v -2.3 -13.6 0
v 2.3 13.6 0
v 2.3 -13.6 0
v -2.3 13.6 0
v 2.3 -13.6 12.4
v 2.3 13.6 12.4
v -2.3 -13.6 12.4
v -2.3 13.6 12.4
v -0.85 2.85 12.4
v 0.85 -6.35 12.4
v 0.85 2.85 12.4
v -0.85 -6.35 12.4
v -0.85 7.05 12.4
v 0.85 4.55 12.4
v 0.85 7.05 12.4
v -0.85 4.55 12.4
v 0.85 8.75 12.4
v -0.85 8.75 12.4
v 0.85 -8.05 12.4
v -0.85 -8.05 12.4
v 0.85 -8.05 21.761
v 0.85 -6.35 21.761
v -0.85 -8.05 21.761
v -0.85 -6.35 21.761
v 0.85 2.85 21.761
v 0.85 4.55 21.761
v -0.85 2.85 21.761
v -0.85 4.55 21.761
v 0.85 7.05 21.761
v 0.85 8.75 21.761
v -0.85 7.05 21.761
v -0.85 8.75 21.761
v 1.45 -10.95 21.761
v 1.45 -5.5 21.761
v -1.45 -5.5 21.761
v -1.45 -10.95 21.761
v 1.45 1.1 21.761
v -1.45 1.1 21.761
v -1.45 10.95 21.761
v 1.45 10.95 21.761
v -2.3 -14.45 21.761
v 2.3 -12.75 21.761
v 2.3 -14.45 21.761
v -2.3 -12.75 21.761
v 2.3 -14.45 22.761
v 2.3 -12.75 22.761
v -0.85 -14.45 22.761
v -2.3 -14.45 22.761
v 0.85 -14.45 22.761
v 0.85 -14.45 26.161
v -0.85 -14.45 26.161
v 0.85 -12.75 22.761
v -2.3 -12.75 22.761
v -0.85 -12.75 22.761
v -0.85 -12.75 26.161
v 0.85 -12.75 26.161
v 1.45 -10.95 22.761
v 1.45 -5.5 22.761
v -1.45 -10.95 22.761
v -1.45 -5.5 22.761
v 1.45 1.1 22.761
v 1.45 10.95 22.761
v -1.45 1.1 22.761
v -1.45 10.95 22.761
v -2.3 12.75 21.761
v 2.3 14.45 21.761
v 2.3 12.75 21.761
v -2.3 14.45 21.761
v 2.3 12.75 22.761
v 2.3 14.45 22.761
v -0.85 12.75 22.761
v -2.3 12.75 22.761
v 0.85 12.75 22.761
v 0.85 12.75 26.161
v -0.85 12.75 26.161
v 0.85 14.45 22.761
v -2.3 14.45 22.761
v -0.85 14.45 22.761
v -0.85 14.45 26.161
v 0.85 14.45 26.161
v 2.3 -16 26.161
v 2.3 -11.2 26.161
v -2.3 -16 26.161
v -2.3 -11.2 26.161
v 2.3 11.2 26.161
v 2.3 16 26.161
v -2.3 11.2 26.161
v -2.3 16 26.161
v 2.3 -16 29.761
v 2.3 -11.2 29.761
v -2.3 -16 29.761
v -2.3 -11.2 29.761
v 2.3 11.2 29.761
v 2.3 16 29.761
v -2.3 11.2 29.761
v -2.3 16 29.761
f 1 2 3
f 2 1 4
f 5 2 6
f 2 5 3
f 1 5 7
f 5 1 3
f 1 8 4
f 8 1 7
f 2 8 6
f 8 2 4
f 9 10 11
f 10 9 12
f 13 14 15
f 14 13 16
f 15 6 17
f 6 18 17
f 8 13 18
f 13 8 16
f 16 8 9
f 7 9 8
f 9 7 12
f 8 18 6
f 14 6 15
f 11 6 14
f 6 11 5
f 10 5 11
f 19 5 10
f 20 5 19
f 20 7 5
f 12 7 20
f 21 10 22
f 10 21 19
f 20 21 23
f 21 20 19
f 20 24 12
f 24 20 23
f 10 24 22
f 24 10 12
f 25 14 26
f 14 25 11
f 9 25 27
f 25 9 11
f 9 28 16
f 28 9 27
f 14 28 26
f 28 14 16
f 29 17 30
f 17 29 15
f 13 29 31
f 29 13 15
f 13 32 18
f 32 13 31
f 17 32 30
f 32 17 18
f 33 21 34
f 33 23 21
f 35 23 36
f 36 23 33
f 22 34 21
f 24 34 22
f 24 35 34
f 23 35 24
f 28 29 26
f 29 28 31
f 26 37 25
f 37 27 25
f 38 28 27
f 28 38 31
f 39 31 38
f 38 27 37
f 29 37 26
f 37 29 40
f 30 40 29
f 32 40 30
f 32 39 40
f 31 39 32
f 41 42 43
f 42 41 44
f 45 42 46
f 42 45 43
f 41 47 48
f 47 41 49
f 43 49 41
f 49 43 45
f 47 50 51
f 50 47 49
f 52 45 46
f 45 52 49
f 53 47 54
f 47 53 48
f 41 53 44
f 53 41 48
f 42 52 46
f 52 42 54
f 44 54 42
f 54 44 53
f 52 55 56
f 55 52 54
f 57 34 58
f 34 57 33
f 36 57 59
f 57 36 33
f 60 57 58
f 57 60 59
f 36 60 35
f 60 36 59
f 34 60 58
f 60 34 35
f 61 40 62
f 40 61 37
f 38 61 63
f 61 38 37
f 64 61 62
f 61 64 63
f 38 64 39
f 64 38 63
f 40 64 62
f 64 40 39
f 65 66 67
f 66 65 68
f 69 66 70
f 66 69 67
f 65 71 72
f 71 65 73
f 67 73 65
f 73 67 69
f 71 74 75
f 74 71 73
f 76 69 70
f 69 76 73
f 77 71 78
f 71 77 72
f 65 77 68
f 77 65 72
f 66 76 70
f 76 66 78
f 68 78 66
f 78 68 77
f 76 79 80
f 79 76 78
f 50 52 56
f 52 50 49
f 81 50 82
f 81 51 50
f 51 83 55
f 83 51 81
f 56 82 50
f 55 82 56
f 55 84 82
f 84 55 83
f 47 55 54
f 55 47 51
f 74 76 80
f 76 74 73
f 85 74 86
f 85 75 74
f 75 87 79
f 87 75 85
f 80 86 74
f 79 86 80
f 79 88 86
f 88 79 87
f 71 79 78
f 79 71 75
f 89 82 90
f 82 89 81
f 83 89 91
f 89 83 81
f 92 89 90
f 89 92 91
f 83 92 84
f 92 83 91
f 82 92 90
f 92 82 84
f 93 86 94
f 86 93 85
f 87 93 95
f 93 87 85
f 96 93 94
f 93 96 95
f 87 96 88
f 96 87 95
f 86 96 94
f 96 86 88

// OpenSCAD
// Generated by SolidPython 0.4.2 on 2020-09-29 23:22:29
//!OpenSCAD

scale(v = 0.0100000000) {
	translate(v = [-230, -1360, 0]) {
		union() {
			color(c = [0.4000000000, 0.4000000000, 0.4000000000]) {
				translate(v = [0, 0, 0]) {
					linear_extrude(height = 1000.0000000000) {
						polygon(paths = [[0, 1, 2, 3]], points = [[0, 0], [0, 2720], [460, 2720], [460, 0]]);
					}
				}
			}
			color(c = [0.2000000000, 0.6000000000, 0.2000000000]) {
				translate(v = [0, 0, 1000.0000000000]) {
					linear_extrude(height = 120.0000000000) {
						polygon(paths = [[0, 1, 2, 3]], points = [[0, 1305], [0, 2720], [460, 2720], [460, 1305]]);
					}
				}
			}
			color(c = [0.4000000000, 0.4000000000, 0.4000000000]) {
				translate(v = [0, 0, 1000.0000000000]) {
					linear_extrude(height = 120.0000000000) {
						polygon(paths = [[0, 1, 2, 3]], points = [[0, 0], [0, 1305], [460, 1305], [460, 0]]);
					}
				}
			}
			color(c = [0.2000000000, 0.6000000000, 0.2000000000]) {
				translate(v = [0, 0, 1120.0000000000]) {
					linear_extrude(height = 120.0000000000) {
						polygon(paths = [[0, 1, 2, 3]], points = [[0, 1305], [0, 2720], [460, 2720], [460, 1305]]);
					}
				}
			}
			color(c = [0.4000000000, 0.4000000000, 0.4000000000]) {
				translate(v = [0, 0, 1120.0000000000]) {
					linear_extrude(height = 120.0000000000) {
						polygon(paths = [[0, 1, 2, 3]], points = [[0, 0], [0, 1305], [460, 1305], [460, 0]]);
					}
				}
			}
			color(c = [0.1000000000, 0.1000000000, 0.1000000000]) {
				translate(v = [0, 0, 1240.0000000000]) {
					linear_extrude(height = 70.0000000000) {
						polygon(paths = [[0, 1, 2, 3]], points = [[145, 555], [145, 725], [315, 725], [315, 555]]);
					}
				}
			}
			color(c = [0.1000000000, 0.1000000000, 0.1000000000]) {
				translate(v = [0, 0, 1240.0000000000]) {
					linear_extrude(height = 70.0000000000) {
						polygon(paths = [[0, 1, 2, 3]], points = [[145, 1645], [145, 1815], [315, 1815], [315, 1645]]);
					}
				}
			}
			color(c = [0.1000000000, 0.1000000000, 0.1000000000]) {
				translate(v = [0, 0, 1240.0000000000]) {
					linear_extrude(height = 70.0000000000) {
						polygon(paths = [[0, 1, 2, 3]], points = [[145, 2065], [145, 2235], [315, 2235], [315, 2065]]);
					}
				}
			}
			color(c = [0.1000000000, 0.1000000000, 0.1000000000]) {
				translate(v = [0, 0, 1310.0000000000]) {
					linear_extrude(height = 180.0000000000) {
						polygon(paths = [[0, 1, 2, 3]], points = [[145, 555], [145, 725], [315, 725], [315, 555]]);
					}
				}
			}
			color(c = [0.1000000000, 0.1000000000, 0.1000000000]) {
				translate(v = [0, 0, 1310.0000000000]) {
					linear_extrude(height = 180.0000000000) {
						polygon(paths = [[0, 1, 2, 3]], points = [[145, 1645], [145, 1815], [315, 1815], [315, 1645]]);
					}
				}
			}
			color(c = [0.1000000000, 0.1000000000, 0.1000000000]) {
				translate(v = [0, 0, 1310.0000000000]) {
					linear_extrude(height = 180.0000000000) {
						polygon(paths = [[0, 1, 2, 3]], points = [[145, 2065], [145, 2235], [315, 2235], [315, 2065]]);
					}
				}
			}
			color(c = [0.1000000000, 0.1000000000, 0.1000000000]) {
				translate(v = [0, 0, 1490.0000000000]) {
					linear_extrude(height = 686.1000000000) {
						polygon(paths = [[0, 1, 2, 3]], points = [[145, 555], [145, 725], [315, 725], [315, 555]]);
					}
				}
			}
			color(c = [0.1000000000, 0.1000000000, 0.1000000000]) {
				translate(v = [0, 0, 1490.0000000000]) {
					linear_extrude(height = 686.1000000000) {
						polygon(paths = [[0, 1, 2, 3]], points = [[145, 1645], [145, 1815], [315, 1815], [315, 1645]]);
					}
				}
			}
			color(c = [0.1000000000, 0.1000000000, 0.1000000000]) {
				translate(v = [0, 0, 1490.0000000000]) {
					linear_extrude(height = 686.1000000000) {
						polygon(paths = [[0, 1, 2, 3]], points = [[145, 2065], [145, 2235], [315, 2235], [315, 2065]]);
					}
				}
			}
			color(c = [0.9000000000, 0.6000000000, 0.6000000000]) {
				translate(v = [0, 0, 2176.1000000000]) {
					linear_extrude(height = 100.0000000000) {
						polygon(paths = [[0, 1, 2, 3]], points = [[0, -85], [0, 85], [460, 85], [460, -85]]);
					}
				}
			}
			color(c = [0.9000000000, 0.6000000000, 0.6000000000]) {
				translate(v = [0, 0, 2176.1000000000]) {
					linear_extrude(height = 100.0000000000) {
						polygon(paths = [[0, 1, 2, 3]], points = [[85, 265], [85, 810], [375, 810], [375, 265]]);
					}
				}
			}
			color(c = [0.9000000000, 0.6000000000, 0.6000000000]) {
				translate(v = [0, 0, 2176.1000000000]) {
					linear_extrude(height = 100.0000000000) {
						polygon(paths = [[0, 1, 2, 3]], points = [[85, 1470], [85, 2455], [375, 2455], [375, 1470]]);
					}
				}
			}
			color(c = [0.9000000000, 0.6000000000, 0.6000000000]) {
				translate(v = [0, 0, 2176.1000000000]) {
					linear_extrude(height = 100.0000000000) {
						polygon(paths = [[0, 1, 2, 3]], points = [[0, 2635], [0, 2805], [460, 2805], [460, 2635]]);
					}
				}
			}
			color(c = [0.5000000000, 0.5000000000, 0.5000000000]) {
				translate(v = [0, 0, 2276.1000000000]) {
					linear_extrude(height = 340.0000000000) {
						polygon(paths = [[0, 1, 2, 3]], points = [[145, -85], [145, 85], [315, 85], [315, -85]]);
					}
				}
			}
			color(c = [0.5000000000, 0.5000000000, 0.5000000000]) {
				translate(v = [0, 0, 2276.1000000000]) {
					linear_extrude(height = 340.0000000000) {
						polygon(paths = [[0, 1, 2, 3]], points = [[145, 2635], [145, 2805], [315, 2805], [315, 2635]]);
					}
				}
			}
			color(c = [0.3000000000, 0.3000000000, 1]) {
				translate(v = [0, 0, 2616.1000000000]) {
					linear_extrude(height = 360.0000000000) {
						polygon(paths = [[0, 1, 2, 3]], points = [[0, -240], [0, 240], [460, 240], [460, -240]]);
					}
				}
			}
			color(c = [0.3000000000, 0.3000000000, 1]) {
				translate(v = [0, 0, 2616.1000000000]) {
					linear_extrude(height = 360.0000000000) {
						polygon(paths = [[0, 1, 2, 3]], points = [[0, 2480], [0, 2960], [460, 2960], [460, 2480]]);
					}
				}
			}
		}
	}
}
